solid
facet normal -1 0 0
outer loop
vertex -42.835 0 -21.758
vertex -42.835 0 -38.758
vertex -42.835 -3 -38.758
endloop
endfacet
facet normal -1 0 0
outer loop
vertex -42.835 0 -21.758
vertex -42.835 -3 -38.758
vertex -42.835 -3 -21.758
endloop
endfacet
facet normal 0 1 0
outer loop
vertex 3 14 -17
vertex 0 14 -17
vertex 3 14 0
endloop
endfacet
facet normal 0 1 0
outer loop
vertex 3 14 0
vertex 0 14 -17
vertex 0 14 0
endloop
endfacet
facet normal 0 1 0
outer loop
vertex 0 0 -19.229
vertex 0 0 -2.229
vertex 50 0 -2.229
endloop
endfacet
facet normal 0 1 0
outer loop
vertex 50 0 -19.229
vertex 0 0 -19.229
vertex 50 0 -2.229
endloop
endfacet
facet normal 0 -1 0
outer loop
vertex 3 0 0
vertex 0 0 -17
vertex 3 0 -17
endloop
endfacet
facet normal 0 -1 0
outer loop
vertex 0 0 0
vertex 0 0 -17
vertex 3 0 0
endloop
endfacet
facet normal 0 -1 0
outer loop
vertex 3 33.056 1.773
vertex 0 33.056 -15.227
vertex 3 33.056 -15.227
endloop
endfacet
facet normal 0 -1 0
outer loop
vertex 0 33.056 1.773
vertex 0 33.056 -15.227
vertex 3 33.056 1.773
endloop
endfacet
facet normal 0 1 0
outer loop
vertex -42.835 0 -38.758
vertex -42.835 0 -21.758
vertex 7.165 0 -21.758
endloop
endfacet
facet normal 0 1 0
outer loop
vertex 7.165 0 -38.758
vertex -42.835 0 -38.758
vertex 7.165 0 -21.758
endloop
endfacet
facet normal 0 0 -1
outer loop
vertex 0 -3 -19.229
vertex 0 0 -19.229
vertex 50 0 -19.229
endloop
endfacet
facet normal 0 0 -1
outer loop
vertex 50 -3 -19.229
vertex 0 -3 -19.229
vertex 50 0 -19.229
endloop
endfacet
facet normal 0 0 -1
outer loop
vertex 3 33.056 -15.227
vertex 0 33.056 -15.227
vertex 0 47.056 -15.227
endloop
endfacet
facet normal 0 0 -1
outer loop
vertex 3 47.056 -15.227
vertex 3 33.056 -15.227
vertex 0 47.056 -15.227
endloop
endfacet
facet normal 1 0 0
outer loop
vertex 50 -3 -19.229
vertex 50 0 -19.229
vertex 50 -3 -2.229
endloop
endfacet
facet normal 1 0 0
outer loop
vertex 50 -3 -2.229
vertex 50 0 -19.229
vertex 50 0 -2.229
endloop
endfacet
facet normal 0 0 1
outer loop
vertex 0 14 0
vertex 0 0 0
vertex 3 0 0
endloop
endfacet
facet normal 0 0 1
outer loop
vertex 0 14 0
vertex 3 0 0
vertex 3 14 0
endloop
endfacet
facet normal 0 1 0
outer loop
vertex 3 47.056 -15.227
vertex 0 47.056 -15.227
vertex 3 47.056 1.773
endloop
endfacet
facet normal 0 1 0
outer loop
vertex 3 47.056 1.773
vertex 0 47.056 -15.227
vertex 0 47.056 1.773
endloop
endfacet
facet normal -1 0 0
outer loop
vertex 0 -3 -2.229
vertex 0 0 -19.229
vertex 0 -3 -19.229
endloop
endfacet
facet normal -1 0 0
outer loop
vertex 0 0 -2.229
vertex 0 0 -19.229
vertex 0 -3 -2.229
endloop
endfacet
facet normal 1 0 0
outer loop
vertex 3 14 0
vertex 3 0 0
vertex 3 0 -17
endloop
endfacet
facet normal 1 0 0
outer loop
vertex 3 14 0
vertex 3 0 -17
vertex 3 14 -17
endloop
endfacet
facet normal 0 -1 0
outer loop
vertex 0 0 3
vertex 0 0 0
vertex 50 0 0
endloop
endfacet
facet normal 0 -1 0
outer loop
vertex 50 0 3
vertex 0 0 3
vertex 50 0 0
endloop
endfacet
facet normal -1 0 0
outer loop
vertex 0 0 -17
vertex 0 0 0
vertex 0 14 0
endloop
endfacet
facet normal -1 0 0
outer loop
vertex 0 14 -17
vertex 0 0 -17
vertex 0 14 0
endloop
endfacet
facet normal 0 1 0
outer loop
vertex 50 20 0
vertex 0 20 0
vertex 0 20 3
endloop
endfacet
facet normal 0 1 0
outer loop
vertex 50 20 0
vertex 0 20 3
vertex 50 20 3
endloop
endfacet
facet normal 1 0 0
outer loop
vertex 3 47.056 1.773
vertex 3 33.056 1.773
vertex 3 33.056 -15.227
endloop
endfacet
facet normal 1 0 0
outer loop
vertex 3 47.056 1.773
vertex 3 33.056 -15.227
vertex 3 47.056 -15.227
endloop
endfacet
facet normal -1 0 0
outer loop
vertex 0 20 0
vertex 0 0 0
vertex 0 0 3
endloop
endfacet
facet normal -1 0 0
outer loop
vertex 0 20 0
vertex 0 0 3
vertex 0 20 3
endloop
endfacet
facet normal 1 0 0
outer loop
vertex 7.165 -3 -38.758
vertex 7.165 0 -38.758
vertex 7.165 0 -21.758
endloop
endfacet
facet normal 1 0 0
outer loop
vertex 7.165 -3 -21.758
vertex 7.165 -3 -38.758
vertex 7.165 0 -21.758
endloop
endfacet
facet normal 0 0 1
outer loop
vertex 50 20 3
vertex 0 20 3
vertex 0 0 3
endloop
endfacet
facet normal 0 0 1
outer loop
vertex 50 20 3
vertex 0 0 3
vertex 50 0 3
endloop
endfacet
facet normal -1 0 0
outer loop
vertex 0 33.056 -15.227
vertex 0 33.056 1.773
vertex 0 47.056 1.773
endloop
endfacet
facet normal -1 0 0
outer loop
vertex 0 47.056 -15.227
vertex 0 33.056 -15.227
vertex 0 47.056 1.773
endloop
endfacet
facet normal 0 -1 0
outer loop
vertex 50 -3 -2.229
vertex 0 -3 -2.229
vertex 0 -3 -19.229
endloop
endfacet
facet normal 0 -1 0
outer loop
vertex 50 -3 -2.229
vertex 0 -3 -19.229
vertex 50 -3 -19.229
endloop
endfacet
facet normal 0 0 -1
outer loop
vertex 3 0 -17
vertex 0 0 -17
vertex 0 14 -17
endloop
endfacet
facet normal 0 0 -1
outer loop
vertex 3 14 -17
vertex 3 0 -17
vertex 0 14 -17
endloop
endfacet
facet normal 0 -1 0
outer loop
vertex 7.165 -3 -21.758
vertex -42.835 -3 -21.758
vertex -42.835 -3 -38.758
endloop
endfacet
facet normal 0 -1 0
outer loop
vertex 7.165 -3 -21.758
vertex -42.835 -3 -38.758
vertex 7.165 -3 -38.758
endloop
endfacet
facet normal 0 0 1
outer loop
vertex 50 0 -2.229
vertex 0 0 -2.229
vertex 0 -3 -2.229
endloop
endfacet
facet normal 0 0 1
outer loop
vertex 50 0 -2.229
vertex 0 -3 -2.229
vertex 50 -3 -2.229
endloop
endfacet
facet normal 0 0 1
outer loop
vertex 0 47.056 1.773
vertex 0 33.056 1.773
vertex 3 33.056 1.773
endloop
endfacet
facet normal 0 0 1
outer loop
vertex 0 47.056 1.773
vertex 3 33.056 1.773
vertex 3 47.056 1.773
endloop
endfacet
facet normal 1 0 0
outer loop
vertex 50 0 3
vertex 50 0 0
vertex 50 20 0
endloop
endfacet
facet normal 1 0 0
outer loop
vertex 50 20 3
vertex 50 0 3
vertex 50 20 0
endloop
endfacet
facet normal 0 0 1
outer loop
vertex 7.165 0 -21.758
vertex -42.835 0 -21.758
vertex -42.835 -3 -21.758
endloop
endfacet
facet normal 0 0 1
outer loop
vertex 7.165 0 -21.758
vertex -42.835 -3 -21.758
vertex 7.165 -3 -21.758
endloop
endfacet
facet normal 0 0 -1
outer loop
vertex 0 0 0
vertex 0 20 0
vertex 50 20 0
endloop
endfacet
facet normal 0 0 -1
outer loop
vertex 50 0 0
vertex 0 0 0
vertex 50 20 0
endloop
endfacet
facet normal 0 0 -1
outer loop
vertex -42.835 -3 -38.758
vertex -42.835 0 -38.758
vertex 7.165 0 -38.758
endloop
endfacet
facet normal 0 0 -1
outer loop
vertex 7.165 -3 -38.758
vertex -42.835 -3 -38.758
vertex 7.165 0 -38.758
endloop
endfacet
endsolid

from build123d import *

# Parameters (mm, degrees)
F1_DEPTH  = 5.08
F3_W      = 50
F3_H      = 20
F4_DEPTH  = 3
F5_W      = 50
F5_H      = 17
F6_DEPTH  = 3
F7_W      = 14
F7_H      = 17
F8_DEPTH  = 3
F9_W      = 14
F9_H      = 17
F10_DEPTH = 3
F11_W     = 50
F11_H     = 17
F12_DEPTH = 3


with BuildPart() as f1:
    # F0 (on Top) → F1 (new body)
    with BuildSketch(Plane.XY):
        Polygon((-95.0850173831, 173.3136475086), (0, 0), (49.2023602128, 0), (-43.2423092425, 173.3136475086), align=None)
    extrude(amount=-F1_DEPTH)


with BuildPart() as f4:
    # F3 (on Top) → F4 (new body)
    with BuildSketch(Plane.XY):
        with Locations((25, 10)):
            Rectangle(F3_W, F3_H)
    extrude(amount=F4_DEPTH)


with BuildPart() as f6:
    # F5 (on Front) → F6 (new body)
    with BuildSketch(Plane.XZ):
        with Locations((25, -10.7288680744)):
            Rectangle(F5_W, F5_H)
    extrude(amount=F6_DEPTH)


with BuildPart() as f8:
    # F7 (on Right) → F8 (new body)
    with BuildSketch(Plane.YZ):
        with Locations((7, -8.5)):
            Rectangle(F7_W, F7_H)
    extrude(amount=F8_DEPTH)


with BuildPart() as f10:
    # F9 (on Right) → F10 (new body)
    with BuildSketch(Plane.YZ):
        with Locations((40.0561373681, -6.7274013827)):
            Rectangle(F9_W, F9_H)
    extrude(amount=F10_DEPTH)


with BuildPart() as f12:
    # F11 (on Front) → F12 (new body)
    with BuildSketch(Plane.XZ):
        with Locations((-17.8345059976, -30.2583783558)):
            Rectangle(F11_W, F11_H)
    extrude(amount=F12_DEPTH)


solid = Compound([f4.part, f6.part, f8.part, f10.part, f12.part])
